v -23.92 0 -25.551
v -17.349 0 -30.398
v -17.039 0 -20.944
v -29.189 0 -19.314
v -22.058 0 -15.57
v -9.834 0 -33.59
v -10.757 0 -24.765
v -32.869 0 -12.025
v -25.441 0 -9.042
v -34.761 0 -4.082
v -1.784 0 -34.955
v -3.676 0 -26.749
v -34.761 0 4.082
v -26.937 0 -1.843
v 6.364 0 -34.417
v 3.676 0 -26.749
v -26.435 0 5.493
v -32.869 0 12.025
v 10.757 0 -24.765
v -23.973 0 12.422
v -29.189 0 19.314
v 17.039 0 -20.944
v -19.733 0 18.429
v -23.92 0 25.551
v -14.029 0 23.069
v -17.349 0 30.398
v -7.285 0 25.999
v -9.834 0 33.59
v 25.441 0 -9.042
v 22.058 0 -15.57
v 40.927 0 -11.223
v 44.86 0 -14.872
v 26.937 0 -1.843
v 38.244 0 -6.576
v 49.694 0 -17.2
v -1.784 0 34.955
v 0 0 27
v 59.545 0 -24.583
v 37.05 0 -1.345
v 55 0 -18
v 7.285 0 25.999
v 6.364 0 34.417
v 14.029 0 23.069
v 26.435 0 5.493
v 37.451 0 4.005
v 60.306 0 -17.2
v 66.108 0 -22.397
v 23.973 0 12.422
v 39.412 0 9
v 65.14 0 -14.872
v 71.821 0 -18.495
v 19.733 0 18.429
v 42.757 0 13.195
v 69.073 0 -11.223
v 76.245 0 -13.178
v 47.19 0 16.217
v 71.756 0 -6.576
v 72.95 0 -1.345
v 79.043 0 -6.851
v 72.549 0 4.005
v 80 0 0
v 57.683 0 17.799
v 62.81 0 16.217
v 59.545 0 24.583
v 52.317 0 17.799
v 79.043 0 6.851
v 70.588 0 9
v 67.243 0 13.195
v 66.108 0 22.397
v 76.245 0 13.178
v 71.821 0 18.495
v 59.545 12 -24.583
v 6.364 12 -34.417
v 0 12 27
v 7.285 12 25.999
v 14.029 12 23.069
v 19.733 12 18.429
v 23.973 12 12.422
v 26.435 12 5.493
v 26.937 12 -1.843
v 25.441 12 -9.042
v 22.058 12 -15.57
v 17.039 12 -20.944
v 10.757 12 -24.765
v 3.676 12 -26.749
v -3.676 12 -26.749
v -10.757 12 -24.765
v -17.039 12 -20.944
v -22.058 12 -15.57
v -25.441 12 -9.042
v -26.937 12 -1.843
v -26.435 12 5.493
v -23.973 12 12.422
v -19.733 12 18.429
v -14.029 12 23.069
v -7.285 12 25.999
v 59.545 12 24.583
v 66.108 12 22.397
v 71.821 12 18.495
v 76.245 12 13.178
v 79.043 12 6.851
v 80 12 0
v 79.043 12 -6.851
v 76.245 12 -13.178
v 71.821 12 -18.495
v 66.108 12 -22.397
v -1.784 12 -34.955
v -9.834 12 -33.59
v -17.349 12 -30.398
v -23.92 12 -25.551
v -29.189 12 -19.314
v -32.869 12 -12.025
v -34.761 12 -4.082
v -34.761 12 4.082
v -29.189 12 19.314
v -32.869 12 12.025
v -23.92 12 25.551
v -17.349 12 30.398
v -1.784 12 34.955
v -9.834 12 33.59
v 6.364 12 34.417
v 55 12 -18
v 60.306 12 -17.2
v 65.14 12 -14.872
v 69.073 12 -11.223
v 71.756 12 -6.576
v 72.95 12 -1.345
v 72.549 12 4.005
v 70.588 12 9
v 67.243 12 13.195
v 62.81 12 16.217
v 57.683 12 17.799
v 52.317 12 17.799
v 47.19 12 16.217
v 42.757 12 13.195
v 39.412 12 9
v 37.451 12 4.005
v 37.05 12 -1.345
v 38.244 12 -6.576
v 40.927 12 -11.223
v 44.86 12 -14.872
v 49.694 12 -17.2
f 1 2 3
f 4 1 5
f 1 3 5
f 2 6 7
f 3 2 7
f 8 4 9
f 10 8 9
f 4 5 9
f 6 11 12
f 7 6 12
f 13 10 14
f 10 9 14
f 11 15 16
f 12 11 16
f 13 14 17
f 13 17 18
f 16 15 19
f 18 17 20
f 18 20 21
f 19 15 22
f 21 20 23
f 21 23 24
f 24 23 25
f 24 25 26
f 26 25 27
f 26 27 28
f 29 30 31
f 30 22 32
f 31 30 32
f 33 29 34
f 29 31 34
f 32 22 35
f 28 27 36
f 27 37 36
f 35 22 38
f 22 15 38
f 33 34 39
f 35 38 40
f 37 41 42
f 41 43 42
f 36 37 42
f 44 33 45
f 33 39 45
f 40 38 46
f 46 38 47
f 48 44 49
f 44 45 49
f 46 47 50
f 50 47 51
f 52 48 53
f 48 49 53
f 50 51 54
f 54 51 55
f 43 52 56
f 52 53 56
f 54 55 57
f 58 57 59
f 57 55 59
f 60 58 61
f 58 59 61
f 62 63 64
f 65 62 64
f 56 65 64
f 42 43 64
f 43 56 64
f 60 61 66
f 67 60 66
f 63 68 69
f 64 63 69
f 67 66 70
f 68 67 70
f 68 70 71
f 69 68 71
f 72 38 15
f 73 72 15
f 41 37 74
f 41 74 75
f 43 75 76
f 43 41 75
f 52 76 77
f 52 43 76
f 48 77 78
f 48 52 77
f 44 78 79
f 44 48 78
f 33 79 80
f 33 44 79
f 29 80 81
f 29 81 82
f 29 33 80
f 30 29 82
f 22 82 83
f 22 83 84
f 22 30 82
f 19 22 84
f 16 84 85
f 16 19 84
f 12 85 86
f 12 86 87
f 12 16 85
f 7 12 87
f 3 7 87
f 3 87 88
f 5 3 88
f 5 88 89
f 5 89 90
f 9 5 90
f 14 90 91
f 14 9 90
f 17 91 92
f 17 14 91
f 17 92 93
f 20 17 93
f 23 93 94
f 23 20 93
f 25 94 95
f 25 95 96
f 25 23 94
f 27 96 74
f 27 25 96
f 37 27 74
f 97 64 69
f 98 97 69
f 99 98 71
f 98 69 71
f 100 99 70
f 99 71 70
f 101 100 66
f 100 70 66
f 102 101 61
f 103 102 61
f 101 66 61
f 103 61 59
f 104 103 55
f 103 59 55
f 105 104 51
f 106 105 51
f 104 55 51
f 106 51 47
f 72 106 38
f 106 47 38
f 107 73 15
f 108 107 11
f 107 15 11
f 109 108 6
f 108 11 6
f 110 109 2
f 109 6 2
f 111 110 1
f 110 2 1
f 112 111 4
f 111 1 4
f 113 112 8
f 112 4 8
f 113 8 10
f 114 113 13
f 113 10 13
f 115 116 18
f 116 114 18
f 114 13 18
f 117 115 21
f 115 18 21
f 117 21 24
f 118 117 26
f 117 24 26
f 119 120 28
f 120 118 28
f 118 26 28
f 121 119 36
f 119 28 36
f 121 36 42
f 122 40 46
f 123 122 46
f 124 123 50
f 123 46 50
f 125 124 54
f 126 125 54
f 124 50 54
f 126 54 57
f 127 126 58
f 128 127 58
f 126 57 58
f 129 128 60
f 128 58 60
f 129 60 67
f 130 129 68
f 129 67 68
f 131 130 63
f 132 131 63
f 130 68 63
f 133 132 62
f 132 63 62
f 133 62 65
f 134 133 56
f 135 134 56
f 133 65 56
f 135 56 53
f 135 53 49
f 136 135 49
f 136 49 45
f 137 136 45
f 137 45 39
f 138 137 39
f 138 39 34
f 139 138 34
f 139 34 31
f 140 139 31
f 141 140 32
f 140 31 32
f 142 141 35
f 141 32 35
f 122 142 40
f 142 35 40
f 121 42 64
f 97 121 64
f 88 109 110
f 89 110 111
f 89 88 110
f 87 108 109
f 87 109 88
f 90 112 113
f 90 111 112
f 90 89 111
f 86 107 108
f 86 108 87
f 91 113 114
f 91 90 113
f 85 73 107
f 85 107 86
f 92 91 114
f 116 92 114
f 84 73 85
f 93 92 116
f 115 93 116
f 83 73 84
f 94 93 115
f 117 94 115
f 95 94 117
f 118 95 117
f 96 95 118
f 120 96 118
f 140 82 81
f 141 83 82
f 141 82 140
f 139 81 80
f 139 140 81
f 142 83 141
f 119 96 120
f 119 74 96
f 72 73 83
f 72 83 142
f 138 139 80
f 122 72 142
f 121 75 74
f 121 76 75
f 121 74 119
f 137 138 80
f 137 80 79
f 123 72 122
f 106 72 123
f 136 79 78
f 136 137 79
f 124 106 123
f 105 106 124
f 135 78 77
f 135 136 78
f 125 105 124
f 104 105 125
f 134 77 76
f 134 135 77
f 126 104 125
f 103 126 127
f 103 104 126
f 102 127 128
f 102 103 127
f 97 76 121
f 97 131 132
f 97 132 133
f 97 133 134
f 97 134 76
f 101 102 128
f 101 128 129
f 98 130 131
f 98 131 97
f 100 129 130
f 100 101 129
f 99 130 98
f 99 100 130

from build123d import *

# Parameters (mm, degrees)
SKETCH_1_R      = 35
SKETCH_1_R_2    = 27
EXTRUDE_1_DEPTH = 12
SKETCH_2_R      = 18
EXTRUDE_2_DEPTH = 12


with BuildPart() as part:
    # 草图1 → 凸台-拉伸1 (new body)
    with BuildSketch(Plane(origin=(0, 0, 0), x_dir=(1, 0, 0), z_dir=(0, 1, 0))):
        with Locations(Location((0, 0, 0), (0, 0, 270))):
            Circle(SKETCH_1_R)
        with Locations(Location((0, 0, 0), (0, 0, 270))):
            Circle(SKETCH_1_R_2, mode=Mode.SUBTRACT)
    extrude(amount=EXTRUDE_1_DEPTH)

    # 草图2 → 凸台-拉伸2 (add)
    with BuildSketch(Plane.XZ):
        with BuildLine():
            Line((6.363636364, 34.416625811), (59.545454545, 24.583304151))
            ThreePointArc((59.545454545, 24.583304151), (80, 0), (59.545454545, -24.583304151))
            Line((59.545454545, -24.583304151), (6.363636364, -34.416625811))
            ThreePointArc((6.363636364, -34.416625811), (35, 0), (6.363636364, 34.416625811))
        make_face()
        with Locations(Location((55, 0, 0), (0, 0, 270))):
            Circle(SKETCH_2_R, mode=Mode.SUBTRACT)
    extrude(amount=-EXTRUDE_2_DEPTH)


solid = part.part
